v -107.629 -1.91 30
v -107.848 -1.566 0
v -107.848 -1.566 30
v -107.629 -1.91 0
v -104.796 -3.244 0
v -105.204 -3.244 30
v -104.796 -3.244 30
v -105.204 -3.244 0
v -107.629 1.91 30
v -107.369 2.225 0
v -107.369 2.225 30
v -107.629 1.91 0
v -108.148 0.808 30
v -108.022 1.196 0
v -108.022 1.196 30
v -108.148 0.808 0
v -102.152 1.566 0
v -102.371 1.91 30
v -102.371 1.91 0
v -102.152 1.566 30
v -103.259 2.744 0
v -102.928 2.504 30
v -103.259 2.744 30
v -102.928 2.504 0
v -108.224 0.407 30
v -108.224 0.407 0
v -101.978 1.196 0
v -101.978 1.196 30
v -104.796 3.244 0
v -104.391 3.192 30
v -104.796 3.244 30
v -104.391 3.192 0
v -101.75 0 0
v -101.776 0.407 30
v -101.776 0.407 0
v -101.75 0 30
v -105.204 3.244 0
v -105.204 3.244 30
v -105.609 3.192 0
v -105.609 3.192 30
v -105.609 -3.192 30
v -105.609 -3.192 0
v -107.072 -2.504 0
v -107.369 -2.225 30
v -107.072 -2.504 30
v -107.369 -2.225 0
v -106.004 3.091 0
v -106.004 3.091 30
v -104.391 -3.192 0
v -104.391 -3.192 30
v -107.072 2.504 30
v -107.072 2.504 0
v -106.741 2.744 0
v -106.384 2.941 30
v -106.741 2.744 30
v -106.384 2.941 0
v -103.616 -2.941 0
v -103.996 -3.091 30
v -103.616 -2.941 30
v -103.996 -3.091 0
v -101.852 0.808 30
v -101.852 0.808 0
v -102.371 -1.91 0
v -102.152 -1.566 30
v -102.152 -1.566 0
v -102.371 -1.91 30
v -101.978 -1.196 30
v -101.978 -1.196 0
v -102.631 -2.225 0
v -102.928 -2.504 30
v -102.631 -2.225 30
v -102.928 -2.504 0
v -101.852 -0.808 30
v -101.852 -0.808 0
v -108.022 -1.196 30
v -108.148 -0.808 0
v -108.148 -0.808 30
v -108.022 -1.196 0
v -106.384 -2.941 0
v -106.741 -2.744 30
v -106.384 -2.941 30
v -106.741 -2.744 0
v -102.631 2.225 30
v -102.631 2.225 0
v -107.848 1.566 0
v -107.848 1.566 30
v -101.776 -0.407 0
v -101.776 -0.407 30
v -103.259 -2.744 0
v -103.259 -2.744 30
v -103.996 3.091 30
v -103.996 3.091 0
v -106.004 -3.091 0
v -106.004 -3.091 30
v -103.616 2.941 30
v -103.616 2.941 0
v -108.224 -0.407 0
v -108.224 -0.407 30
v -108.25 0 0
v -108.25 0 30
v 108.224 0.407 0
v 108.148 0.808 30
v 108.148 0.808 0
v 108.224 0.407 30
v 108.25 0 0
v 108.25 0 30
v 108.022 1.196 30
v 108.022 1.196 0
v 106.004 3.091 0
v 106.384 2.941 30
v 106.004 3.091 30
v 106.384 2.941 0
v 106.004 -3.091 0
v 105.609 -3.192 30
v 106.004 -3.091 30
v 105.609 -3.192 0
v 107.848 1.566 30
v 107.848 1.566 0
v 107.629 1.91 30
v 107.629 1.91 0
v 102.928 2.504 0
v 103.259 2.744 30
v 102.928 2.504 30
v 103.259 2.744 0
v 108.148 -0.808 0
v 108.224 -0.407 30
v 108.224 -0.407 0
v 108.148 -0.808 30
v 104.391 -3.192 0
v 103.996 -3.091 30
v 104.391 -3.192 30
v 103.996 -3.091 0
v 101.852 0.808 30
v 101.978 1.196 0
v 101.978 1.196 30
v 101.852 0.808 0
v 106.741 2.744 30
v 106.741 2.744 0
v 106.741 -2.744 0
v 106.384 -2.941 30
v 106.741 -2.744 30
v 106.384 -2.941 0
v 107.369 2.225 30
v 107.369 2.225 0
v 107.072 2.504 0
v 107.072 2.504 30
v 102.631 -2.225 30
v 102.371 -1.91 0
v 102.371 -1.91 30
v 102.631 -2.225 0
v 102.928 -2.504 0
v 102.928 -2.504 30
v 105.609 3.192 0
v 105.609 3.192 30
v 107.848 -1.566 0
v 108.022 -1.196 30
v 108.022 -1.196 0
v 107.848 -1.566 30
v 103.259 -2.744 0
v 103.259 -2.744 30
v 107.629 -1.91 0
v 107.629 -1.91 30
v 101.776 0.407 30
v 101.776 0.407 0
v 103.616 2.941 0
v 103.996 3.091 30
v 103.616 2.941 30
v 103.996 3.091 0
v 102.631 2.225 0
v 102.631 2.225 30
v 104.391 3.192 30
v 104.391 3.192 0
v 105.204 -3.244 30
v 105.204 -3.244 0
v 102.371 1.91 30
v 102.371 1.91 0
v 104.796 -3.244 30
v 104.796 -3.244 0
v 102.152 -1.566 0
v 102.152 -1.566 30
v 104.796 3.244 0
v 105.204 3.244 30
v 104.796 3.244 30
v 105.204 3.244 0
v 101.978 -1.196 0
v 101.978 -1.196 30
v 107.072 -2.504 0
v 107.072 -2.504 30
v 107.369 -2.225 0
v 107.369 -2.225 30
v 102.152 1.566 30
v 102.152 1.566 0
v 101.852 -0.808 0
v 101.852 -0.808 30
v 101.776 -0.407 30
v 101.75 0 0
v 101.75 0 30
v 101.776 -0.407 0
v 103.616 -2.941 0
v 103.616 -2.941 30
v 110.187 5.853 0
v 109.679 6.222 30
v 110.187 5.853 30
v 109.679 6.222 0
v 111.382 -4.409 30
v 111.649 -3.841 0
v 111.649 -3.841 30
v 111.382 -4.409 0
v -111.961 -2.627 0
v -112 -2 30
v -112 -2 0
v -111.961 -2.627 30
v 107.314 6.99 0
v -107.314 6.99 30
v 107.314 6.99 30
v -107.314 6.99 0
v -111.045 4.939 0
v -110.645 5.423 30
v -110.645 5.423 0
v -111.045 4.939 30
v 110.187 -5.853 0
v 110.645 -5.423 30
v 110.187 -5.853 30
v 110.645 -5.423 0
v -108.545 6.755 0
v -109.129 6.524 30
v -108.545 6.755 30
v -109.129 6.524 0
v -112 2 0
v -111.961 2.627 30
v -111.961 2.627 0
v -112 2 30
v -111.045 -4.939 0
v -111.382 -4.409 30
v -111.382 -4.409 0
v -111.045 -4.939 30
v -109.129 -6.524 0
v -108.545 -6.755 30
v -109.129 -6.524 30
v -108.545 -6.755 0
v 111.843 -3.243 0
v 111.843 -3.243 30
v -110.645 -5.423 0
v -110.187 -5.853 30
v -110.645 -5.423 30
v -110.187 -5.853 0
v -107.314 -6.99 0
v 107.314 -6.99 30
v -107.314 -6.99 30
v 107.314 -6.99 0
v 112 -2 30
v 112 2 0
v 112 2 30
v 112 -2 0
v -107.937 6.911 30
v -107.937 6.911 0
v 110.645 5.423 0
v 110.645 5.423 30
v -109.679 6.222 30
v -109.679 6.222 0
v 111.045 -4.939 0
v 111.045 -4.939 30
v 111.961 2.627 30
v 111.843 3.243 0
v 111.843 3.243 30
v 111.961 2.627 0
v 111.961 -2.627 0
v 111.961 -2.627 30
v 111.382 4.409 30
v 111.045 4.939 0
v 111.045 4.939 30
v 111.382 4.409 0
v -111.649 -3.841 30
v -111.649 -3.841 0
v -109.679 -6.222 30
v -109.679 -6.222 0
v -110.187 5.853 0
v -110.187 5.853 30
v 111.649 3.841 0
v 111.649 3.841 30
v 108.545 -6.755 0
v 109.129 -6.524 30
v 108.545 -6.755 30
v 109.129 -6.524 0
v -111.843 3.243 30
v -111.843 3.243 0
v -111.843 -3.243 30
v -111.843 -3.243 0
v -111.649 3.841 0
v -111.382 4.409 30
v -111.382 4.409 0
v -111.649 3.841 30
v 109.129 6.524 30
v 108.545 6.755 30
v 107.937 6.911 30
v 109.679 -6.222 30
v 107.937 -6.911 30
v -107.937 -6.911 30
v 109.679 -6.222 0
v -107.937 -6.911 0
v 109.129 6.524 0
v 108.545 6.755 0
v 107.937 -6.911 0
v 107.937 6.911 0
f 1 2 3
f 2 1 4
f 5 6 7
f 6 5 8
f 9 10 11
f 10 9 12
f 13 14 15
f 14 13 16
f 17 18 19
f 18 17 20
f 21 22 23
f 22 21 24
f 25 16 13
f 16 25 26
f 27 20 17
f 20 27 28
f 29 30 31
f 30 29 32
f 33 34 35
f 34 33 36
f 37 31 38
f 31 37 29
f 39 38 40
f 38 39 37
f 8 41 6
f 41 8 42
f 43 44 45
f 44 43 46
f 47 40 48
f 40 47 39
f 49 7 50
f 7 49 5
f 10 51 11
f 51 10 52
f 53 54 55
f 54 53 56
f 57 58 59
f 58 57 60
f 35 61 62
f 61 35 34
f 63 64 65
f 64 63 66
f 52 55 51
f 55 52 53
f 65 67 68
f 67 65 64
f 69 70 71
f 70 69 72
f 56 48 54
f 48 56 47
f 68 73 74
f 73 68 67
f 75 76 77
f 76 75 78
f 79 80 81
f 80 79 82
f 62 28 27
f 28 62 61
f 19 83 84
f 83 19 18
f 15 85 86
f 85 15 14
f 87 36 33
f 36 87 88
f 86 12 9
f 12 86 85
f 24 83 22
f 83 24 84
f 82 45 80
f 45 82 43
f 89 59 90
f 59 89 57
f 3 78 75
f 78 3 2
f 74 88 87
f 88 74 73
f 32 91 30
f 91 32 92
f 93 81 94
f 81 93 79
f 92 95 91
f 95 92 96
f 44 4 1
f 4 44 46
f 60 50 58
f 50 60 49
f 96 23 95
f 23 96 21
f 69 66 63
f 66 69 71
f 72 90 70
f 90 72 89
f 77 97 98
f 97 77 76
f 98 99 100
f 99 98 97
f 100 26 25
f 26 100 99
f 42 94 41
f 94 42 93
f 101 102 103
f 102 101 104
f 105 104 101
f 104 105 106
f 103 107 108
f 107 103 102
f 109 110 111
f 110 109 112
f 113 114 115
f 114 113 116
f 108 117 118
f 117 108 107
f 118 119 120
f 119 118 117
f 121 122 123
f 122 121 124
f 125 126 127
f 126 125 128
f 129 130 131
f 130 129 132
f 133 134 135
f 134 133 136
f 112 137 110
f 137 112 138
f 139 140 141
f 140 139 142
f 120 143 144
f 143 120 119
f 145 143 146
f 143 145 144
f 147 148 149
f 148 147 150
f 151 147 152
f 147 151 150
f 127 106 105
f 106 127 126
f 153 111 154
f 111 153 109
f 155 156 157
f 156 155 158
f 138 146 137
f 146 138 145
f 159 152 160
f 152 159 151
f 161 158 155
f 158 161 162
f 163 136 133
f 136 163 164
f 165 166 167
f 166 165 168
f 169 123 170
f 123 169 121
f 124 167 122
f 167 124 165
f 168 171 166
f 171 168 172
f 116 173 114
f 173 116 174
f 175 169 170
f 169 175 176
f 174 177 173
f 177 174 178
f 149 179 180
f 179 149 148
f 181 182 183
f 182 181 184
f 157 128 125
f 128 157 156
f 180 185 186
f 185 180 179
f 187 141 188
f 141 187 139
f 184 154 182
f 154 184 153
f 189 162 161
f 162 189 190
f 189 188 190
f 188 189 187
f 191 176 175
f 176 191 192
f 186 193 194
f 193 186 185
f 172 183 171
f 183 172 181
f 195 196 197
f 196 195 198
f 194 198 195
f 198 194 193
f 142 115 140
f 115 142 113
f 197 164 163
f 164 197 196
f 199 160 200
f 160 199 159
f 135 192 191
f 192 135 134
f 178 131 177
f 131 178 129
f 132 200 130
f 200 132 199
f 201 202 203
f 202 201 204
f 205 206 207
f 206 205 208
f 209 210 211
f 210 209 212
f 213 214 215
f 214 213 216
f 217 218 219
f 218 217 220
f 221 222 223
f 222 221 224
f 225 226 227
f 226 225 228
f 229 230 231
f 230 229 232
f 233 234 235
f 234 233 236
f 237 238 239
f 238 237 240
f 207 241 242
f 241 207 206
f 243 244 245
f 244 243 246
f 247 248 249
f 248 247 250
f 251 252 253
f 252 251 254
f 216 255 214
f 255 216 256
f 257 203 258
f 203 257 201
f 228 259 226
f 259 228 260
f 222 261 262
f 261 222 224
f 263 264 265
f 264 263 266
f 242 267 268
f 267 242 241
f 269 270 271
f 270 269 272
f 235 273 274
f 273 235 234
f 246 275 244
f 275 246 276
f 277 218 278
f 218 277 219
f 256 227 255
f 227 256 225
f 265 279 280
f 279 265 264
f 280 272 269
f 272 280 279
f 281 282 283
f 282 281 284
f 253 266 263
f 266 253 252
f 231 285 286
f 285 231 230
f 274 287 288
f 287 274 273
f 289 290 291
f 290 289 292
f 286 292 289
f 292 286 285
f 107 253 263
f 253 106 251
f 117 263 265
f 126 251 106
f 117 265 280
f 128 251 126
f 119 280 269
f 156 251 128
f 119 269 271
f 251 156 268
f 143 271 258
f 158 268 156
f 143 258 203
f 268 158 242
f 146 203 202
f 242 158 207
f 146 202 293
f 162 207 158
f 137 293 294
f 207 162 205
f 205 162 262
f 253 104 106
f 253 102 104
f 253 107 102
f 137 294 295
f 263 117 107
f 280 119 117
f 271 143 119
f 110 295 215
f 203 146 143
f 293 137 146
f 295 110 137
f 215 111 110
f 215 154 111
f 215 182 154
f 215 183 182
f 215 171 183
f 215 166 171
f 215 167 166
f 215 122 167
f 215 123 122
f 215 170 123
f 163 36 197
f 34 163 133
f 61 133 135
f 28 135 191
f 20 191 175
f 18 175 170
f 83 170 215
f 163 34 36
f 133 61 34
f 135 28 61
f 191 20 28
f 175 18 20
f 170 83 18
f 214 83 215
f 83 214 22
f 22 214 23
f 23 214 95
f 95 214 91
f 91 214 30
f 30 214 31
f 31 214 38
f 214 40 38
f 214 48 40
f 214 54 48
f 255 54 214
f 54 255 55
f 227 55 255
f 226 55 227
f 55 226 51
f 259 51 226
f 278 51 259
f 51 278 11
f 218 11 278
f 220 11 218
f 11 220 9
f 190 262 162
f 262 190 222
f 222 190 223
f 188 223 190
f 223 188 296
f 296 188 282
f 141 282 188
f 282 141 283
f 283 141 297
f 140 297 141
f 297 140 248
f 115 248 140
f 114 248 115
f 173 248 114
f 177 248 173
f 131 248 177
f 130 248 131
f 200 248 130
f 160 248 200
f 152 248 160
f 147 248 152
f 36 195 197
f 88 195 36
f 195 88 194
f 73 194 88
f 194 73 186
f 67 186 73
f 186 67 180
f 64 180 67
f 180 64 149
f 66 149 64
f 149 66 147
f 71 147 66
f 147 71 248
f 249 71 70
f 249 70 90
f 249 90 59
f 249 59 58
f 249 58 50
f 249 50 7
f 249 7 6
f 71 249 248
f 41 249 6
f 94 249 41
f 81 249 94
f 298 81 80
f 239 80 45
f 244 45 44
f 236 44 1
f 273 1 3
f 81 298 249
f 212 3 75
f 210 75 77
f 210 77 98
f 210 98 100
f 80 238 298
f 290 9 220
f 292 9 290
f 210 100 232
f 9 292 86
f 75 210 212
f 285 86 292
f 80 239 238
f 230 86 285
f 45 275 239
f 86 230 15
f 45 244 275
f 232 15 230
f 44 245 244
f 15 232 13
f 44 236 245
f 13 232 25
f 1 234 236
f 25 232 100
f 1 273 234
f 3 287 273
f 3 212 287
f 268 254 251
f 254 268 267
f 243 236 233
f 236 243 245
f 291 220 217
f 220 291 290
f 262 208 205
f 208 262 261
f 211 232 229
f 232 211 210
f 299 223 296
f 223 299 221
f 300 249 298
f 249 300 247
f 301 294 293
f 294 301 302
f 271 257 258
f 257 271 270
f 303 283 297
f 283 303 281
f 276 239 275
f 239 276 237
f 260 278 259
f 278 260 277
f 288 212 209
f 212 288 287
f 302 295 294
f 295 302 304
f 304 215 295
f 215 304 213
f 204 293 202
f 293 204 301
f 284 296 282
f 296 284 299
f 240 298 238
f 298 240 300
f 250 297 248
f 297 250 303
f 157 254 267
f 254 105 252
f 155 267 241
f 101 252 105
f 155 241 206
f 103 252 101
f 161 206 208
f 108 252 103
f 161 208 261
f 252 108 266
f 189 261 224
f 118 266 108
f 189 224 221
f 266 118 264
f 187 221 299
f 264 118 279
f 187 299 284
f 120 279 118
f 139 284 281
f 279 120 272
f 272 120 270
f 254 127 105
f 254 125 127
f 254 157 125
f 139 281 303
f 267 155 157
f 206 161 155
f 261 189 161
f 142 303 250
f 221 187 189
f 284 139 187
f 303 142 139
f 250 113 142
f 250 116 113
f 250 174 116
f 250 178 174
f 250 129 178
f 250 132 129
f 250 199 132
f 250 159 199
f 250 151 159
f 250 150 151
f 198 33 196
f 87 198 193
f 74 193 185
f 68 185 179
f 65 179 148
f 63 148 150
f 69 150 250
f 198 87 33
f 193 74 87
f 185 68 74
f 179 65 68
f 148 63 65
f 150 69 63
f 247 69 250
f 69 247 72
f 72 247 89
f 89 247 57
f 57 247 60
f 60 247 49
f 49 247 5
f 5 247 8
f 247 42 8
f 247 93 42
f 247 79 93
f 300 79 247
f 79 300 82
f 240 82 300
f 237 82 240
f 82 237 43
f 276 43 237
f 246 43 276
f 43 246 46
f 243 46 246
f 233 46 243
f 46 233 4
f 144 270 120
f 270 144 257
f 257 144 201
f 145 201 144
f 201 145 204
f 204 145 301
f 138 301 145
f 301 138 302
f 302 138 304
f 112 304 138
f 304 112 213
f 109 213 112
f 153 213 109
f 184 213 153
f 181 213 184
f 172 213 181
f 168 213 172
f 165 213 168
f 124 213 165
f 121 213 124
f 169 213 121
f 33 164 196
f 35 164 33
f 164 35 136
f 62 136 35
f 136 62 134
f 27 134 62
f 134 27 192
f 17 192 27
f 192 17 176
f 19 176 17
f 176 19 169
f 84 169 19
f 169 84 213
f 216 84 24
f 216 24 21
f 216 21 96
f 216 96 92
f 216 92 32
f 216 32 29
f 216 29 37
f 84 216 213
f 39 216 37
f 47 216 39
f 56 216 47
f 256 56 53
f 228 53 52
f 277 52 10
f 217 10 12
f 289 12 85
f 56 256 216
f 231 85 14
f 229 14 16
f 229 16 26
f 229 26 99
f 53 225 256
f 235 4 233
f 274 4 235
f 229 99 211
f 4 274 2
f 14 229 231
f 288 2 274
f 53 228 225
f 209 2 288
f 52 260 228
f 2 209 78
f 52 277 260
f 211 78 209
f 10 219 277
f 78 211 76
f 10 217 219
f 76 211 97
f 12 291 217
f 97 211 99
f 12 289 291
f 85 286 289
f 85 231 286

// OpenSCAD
$fn = 50;


difference() {
	union() {
		hull() {
			translate(v = [-107.0000000000, 2.0000000000, 0]) {
				cylinder(h = 30, r = 5);
			}
			translate(v = [107.0000000000, 2.0000000000, 0]) {
				cylinder(h = 30, r = 5);
			}
			translate(v = [-107.0000000000, -2.0000000000, 0]) {
				cylinder(h = 30, r = 5);
			}
			translate(v = [107.0000000000, -2.0000000000, 0]) {
				cylinder(h = 30, r = 5);
			}
		}
	}
	union() {
		translate(v = [-105.0000000000, 0.0000000000, -100.0000000000]) {
			cylinder(h = 200, r = 3.2500000000);
		}
		translate(v = [-105.0000000000, 0.0000000000, -100.0000000000]) {
			cylinder(h = 200, r = 3.2500000000);
		}
		translate(v = [105.0000000000, 0.0000000000, -100.0000000000]) {
			cylinder(h = 200, r = 3.2500000000);
		}
		translate(v = [105.0000000000, 0.0000000000, -100.0000000000]) {
			cylinder(h = 200, r = 3.2500000000);
		}
	}
}
